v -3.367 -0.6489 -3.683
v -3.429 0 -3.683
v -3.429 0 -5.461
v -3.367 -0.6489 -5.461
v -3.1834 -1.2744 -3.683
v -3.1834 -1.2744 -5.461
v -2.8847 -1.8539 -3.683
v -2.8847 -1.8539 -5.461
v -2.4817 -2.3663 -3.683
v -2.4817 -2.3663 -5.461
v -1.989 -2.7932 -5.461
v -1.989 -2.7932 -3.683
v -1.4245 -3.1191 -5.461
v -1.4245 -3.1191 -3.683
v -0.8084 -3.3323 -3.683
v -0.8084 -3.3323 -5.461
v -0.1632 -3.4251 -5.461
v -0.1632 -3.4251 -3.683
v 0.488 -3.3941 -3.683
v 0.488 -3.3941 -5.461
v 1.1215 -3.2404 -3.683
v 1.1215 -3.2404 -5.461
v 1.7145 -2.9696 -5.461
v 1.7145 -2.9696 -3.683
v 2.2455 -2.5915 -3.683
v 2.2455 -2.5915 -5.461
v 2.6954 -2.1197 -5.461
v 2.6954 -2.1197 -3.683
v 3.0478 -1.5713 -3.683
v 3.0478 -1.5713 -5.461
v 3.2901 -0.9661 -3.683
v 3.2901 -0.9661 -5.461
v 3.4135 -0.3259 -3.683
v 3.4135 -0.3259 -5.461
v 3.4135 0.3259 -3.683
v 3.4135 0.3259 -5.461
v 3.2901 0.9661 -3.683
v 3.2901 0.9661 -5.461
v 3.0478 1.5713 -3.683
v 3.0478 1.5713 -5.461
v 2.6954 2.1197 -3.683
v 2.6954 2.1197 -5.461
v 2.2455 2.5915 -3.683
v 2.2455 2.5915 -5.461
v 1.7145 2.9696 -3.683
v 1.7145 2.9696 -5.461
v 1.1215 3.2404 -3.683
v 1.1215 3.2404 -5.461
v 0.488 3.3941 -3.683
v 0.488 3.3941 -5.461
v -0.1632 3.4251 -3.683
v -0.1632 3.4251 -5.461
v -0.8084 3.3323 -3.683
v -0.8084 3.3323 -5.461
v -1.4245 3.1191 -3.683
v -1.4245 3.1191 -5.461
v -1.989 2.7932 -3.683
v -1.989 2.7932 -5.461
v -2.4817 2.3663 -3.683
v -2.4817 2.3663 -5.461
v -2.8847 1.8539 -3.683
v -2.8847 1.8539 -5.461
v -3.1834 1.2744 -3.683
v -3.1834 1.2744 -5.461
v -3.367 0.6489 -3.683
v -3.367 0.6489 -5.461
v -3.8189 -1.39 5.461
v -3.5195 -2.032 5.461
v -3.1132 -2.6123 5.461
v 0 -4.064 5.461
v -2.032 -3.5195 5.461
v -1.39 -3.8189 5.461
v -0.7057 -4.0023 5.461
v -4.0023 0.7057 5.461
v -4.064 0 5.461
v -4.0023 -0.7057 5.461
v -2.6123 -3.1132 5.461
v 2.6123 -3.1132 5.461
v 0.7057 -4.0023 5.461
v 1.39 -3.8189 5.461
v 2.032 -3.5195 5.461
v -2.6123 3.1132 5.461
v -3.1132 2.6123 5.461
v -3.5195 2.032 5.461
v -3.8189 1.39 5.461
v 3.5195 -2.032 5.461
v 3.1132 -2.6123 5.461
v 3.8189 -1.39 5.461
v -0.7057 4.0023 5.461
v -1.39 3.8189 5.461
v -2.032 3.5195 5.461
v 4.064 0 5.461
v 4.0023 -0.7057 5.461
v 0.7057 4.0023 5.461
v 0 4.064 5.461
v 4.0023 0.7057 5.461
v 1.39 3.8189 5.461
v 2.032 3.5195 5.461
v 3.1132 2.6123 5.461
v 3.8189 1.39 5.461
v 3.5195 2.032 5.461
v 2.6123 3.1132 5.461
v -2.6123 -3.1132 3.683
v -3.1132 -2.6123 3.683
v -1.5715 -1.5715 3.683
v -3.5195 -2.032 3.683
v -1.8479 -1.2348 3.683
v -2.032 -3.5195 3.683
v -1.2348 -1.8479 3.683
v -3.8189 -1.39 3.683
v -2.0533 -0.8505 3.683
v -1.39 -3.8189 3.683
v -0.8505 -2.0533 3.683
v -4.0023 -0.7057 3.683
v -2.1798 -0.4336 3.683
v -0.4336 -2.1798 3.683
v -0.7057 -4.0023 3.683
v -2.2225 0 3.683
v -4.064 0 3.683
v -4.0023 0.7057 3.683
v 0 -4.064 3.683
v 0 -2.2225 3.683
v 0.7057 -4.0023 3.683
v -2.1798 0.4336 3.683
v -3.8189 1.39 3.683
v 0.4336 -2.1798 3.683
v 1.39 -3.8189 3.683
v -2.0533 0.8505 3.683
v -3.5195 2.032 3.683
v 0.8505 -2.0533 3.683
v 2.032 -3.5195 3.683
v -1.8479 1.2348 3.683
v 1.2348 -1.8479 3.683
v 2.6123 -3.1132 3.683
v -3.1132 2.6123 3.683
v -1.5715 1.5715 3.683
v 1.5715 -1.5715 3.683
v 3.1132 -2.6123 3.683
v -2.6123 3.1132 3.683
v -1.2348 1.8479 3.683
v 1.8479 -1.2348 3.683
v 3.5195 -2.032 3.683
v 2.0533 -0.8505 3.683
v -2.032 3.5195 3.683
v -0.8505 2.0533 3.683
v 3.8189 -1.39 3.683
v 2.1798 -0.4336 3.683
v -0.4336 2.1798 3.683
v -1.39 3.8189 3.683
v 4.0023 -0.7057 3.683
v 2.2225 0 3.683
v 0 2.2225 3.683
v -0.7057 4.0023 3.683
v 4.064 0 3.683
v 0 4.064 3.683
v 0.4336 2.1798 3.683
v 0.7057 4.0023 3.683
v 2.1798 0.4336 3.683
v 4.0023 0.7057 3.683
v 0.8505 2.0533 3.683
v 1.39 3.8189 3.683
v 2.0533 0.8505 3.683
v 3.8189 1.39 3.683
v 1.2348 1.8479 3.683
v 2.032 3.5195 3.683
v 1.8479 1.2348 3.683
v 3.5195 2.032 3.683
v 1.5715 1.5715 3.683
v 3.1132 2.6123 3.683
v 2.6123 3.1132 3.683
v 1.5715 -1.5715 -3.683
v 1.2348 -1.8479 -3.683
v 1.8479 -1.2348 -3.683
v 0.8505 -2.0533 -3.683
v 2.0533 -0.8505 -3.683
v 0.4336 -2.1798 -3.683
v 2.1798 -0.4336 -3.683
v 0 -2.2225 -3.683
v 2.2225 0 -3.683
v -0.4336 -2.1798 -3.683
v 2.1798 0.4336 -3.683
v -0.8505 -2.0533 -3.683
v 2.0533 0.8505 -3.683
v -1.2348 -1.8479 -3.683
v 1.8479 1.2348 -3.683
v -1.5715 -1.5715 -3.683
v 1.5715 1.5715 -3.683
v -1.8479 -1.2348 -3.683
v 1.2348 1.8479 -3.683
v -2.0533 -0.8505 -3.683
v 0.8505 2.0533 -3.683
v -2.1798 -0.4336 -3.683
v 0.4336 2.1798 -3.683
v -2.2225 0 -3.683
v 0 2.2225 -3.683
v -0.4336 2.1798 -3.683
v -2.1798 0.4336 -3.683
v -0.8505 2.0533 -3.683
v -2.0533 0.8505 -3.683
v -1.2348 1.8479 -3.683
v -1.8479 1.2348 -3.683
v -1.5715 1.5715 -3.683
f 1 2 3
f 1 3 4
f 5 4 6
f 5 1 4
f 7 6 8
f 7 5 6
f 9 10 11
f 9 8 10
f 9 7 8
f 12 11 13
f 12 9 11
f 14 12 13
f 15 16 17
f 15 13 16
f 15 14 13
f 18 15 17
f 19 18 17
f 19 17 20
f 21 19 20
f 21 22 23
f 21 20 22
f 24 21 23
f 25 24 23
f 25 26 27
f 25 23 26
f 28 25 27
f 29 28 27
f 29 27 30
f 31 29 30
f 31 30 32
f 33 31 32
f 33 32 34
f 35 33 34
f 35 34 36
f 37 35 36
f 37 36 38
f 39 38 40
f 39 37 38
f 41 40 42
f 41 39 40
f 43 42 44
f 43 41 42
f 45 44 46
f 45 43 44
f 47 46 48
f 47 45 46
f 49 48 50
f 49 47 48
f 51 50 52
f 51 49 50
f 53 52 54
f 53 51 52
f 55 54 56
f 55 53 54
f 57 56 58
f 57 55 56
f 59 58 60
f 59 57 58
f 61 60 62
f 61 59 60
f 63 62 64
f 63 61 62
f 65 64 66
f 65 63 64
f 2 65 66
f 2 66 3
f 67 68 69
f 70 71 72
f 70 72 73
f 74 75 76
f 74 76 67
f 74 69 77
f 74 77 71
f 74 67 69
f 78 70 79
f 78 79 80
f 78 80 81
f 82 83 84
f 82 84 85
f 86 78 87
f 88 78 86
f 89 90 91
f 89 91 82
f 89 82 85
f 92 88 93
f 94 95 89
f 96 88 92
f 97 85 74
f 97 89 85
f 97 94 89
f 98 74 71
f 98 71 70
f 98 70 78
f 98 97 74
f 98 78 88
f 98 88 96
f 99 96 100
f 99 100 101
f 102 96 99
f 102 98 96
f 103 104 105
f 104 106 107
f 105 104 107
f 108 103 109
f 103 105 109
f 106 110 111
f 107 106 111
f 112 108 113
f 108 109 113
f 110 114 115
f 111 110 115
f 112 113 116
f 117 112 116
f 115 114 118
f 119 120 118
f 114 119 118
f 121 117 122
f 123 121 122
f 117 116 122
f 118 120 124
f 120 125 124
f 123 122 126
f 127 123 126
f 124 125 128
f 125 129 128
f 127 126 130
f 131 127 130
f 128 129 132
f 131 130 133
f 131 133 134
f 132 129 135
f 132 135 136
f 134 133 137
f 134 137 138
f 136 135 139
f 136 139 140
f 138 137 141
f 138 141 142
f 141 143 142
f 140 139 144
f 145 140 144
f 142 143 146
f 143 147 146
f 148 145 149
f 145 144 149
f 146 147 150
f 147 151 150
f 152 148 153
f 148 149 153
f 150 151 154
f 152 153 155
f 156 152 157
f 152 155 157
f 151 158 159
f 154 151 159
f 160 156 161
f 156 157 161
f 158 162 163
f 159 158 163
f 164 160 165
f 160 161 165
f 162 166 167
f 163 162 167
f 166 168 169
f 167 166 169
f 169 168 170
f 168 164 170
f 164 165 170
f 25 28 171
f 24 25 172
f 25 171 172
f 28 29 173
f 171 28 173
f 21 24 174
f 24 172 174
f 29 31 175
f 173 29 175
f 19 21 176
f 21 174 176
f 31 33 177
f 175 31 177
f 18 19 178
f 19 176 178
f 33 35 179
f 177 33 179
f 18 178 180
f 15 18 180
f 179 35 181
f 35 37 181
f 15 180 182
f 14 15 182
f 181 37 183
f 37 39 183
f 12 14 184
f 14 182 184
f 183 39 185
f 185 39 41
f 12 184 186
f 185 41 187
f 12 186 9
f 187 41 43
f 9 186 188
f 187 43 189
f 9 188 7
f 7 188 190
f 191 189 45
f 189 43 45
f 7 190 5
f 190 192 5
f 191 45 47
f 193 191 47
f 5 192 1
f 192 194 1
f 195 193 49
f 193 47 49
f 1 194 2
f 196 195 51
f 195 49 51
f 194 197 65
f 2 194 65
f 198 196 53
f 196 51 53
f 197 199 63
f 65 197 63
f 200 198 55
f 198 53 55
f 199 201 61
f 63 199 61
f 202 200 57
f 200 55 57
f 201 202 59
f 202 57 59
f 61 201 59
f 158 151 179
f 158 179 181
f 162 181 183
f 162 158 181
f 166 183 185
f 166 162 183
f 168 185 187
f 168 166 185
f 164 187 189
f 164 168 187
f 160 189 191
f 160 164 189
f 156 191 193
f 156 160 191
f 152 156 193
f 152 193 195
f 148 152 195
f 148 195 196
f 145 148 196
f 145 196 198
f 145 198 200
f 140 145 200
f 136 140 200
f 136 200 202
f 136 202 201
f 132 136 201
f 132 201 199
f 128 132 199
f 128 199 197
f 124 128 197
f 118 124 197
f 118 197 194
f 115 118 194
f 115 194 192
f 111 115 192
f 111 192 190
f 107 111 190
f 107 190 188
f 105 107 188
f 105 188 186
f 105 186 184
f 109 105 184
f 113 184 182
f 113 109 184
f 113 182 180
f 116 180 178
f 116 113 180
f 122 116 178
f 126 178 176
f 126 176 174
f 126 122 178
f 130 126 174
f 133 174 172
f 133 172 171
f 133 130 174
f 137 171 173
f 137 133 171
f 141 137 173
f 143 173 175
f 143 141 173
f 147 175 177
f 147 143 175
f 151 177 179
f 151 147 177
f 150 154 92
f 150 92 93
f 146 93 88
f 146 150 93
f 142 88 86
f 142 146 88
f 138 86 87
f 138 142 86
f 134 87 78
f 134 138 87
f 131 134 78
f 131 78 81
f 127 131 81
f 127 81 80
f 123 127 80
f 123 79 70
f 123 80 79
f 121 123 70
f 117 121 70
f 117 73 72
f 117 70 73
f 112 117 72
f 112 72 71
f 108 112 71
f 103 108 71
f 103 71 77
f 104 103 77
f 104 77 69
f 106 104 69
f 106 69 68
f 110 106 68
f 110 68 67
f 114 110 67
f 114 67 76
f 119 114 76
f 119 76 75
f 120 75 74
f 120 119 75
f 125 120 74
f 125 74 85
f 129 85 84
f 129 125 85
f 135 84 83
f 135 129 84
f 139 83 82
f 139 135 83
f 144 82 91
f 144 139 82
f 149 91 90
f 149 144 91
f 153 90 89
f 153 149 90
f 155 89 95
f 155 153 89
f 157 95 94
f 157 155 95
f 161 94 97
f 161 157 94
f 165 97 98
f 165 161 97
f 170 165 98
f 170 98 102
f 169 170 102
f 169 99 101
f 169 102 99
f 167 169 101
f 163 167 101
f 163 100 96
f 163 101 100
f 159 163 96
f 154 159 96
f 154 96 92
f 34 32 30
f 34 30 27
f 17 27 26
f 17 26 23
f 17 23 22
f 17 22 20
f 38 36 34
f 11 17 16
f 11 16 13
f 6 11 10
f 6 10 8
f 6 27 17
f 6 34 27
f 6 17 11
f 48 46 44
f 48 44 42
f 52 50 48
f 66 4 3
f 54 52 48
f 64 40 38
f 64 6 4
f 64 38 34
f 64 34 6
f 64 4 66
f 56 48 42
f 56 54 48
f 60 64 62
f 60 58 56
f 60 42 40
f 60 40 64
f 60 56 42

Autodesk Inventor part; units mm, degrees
ref_plane "YZ Plane" through (0, 0, 0) normal (1, 0, 0) x (0, 1, 0)
ref_plane "XZ Plane" through (0, 0, 0) normal (0, 1, 0) x (-1, 0, 0)
ref_plane "XY Plane" through (0, 0, 0) normal (0, 0, 1) x (1, 0, 0)
sketch "Sketch1" plane through (0, 0, 0) normal (0, 0, 1) x (1, 0, 0)
  circle A0 centre (0, 0) radius 2.2225
  dimension "d0" = 4.445
extrude "Extrusion1" add sketch "Sketch1" along normal mid plane 7.366
sketch "Sketch2" plane through (0, 0, 3.683) normal (0, 0, 1) x (1, 0, 0)
  circle A0 centre (0, 0) radius 2.2225 projected
  circle A1 centre (0, 0) radius 4.064
  dimension "d3" = 8.128
extrude "Extrusion2" add sketch "Sketch2" along normal blind 1.778 contours A0 | A1
sketch "Sketch3" plane through (0, 0, -3.683) normal (0, 0, -1) x (-1, 0, 0)
  circle A0 centre (0, 0) radius 3.429
  dimension "d6" = 6.858
extrude "Extrusion3" add sketch "Sketch3" along normal blind 1.778
properties part number "Rivet" material "Stainless Steel"
